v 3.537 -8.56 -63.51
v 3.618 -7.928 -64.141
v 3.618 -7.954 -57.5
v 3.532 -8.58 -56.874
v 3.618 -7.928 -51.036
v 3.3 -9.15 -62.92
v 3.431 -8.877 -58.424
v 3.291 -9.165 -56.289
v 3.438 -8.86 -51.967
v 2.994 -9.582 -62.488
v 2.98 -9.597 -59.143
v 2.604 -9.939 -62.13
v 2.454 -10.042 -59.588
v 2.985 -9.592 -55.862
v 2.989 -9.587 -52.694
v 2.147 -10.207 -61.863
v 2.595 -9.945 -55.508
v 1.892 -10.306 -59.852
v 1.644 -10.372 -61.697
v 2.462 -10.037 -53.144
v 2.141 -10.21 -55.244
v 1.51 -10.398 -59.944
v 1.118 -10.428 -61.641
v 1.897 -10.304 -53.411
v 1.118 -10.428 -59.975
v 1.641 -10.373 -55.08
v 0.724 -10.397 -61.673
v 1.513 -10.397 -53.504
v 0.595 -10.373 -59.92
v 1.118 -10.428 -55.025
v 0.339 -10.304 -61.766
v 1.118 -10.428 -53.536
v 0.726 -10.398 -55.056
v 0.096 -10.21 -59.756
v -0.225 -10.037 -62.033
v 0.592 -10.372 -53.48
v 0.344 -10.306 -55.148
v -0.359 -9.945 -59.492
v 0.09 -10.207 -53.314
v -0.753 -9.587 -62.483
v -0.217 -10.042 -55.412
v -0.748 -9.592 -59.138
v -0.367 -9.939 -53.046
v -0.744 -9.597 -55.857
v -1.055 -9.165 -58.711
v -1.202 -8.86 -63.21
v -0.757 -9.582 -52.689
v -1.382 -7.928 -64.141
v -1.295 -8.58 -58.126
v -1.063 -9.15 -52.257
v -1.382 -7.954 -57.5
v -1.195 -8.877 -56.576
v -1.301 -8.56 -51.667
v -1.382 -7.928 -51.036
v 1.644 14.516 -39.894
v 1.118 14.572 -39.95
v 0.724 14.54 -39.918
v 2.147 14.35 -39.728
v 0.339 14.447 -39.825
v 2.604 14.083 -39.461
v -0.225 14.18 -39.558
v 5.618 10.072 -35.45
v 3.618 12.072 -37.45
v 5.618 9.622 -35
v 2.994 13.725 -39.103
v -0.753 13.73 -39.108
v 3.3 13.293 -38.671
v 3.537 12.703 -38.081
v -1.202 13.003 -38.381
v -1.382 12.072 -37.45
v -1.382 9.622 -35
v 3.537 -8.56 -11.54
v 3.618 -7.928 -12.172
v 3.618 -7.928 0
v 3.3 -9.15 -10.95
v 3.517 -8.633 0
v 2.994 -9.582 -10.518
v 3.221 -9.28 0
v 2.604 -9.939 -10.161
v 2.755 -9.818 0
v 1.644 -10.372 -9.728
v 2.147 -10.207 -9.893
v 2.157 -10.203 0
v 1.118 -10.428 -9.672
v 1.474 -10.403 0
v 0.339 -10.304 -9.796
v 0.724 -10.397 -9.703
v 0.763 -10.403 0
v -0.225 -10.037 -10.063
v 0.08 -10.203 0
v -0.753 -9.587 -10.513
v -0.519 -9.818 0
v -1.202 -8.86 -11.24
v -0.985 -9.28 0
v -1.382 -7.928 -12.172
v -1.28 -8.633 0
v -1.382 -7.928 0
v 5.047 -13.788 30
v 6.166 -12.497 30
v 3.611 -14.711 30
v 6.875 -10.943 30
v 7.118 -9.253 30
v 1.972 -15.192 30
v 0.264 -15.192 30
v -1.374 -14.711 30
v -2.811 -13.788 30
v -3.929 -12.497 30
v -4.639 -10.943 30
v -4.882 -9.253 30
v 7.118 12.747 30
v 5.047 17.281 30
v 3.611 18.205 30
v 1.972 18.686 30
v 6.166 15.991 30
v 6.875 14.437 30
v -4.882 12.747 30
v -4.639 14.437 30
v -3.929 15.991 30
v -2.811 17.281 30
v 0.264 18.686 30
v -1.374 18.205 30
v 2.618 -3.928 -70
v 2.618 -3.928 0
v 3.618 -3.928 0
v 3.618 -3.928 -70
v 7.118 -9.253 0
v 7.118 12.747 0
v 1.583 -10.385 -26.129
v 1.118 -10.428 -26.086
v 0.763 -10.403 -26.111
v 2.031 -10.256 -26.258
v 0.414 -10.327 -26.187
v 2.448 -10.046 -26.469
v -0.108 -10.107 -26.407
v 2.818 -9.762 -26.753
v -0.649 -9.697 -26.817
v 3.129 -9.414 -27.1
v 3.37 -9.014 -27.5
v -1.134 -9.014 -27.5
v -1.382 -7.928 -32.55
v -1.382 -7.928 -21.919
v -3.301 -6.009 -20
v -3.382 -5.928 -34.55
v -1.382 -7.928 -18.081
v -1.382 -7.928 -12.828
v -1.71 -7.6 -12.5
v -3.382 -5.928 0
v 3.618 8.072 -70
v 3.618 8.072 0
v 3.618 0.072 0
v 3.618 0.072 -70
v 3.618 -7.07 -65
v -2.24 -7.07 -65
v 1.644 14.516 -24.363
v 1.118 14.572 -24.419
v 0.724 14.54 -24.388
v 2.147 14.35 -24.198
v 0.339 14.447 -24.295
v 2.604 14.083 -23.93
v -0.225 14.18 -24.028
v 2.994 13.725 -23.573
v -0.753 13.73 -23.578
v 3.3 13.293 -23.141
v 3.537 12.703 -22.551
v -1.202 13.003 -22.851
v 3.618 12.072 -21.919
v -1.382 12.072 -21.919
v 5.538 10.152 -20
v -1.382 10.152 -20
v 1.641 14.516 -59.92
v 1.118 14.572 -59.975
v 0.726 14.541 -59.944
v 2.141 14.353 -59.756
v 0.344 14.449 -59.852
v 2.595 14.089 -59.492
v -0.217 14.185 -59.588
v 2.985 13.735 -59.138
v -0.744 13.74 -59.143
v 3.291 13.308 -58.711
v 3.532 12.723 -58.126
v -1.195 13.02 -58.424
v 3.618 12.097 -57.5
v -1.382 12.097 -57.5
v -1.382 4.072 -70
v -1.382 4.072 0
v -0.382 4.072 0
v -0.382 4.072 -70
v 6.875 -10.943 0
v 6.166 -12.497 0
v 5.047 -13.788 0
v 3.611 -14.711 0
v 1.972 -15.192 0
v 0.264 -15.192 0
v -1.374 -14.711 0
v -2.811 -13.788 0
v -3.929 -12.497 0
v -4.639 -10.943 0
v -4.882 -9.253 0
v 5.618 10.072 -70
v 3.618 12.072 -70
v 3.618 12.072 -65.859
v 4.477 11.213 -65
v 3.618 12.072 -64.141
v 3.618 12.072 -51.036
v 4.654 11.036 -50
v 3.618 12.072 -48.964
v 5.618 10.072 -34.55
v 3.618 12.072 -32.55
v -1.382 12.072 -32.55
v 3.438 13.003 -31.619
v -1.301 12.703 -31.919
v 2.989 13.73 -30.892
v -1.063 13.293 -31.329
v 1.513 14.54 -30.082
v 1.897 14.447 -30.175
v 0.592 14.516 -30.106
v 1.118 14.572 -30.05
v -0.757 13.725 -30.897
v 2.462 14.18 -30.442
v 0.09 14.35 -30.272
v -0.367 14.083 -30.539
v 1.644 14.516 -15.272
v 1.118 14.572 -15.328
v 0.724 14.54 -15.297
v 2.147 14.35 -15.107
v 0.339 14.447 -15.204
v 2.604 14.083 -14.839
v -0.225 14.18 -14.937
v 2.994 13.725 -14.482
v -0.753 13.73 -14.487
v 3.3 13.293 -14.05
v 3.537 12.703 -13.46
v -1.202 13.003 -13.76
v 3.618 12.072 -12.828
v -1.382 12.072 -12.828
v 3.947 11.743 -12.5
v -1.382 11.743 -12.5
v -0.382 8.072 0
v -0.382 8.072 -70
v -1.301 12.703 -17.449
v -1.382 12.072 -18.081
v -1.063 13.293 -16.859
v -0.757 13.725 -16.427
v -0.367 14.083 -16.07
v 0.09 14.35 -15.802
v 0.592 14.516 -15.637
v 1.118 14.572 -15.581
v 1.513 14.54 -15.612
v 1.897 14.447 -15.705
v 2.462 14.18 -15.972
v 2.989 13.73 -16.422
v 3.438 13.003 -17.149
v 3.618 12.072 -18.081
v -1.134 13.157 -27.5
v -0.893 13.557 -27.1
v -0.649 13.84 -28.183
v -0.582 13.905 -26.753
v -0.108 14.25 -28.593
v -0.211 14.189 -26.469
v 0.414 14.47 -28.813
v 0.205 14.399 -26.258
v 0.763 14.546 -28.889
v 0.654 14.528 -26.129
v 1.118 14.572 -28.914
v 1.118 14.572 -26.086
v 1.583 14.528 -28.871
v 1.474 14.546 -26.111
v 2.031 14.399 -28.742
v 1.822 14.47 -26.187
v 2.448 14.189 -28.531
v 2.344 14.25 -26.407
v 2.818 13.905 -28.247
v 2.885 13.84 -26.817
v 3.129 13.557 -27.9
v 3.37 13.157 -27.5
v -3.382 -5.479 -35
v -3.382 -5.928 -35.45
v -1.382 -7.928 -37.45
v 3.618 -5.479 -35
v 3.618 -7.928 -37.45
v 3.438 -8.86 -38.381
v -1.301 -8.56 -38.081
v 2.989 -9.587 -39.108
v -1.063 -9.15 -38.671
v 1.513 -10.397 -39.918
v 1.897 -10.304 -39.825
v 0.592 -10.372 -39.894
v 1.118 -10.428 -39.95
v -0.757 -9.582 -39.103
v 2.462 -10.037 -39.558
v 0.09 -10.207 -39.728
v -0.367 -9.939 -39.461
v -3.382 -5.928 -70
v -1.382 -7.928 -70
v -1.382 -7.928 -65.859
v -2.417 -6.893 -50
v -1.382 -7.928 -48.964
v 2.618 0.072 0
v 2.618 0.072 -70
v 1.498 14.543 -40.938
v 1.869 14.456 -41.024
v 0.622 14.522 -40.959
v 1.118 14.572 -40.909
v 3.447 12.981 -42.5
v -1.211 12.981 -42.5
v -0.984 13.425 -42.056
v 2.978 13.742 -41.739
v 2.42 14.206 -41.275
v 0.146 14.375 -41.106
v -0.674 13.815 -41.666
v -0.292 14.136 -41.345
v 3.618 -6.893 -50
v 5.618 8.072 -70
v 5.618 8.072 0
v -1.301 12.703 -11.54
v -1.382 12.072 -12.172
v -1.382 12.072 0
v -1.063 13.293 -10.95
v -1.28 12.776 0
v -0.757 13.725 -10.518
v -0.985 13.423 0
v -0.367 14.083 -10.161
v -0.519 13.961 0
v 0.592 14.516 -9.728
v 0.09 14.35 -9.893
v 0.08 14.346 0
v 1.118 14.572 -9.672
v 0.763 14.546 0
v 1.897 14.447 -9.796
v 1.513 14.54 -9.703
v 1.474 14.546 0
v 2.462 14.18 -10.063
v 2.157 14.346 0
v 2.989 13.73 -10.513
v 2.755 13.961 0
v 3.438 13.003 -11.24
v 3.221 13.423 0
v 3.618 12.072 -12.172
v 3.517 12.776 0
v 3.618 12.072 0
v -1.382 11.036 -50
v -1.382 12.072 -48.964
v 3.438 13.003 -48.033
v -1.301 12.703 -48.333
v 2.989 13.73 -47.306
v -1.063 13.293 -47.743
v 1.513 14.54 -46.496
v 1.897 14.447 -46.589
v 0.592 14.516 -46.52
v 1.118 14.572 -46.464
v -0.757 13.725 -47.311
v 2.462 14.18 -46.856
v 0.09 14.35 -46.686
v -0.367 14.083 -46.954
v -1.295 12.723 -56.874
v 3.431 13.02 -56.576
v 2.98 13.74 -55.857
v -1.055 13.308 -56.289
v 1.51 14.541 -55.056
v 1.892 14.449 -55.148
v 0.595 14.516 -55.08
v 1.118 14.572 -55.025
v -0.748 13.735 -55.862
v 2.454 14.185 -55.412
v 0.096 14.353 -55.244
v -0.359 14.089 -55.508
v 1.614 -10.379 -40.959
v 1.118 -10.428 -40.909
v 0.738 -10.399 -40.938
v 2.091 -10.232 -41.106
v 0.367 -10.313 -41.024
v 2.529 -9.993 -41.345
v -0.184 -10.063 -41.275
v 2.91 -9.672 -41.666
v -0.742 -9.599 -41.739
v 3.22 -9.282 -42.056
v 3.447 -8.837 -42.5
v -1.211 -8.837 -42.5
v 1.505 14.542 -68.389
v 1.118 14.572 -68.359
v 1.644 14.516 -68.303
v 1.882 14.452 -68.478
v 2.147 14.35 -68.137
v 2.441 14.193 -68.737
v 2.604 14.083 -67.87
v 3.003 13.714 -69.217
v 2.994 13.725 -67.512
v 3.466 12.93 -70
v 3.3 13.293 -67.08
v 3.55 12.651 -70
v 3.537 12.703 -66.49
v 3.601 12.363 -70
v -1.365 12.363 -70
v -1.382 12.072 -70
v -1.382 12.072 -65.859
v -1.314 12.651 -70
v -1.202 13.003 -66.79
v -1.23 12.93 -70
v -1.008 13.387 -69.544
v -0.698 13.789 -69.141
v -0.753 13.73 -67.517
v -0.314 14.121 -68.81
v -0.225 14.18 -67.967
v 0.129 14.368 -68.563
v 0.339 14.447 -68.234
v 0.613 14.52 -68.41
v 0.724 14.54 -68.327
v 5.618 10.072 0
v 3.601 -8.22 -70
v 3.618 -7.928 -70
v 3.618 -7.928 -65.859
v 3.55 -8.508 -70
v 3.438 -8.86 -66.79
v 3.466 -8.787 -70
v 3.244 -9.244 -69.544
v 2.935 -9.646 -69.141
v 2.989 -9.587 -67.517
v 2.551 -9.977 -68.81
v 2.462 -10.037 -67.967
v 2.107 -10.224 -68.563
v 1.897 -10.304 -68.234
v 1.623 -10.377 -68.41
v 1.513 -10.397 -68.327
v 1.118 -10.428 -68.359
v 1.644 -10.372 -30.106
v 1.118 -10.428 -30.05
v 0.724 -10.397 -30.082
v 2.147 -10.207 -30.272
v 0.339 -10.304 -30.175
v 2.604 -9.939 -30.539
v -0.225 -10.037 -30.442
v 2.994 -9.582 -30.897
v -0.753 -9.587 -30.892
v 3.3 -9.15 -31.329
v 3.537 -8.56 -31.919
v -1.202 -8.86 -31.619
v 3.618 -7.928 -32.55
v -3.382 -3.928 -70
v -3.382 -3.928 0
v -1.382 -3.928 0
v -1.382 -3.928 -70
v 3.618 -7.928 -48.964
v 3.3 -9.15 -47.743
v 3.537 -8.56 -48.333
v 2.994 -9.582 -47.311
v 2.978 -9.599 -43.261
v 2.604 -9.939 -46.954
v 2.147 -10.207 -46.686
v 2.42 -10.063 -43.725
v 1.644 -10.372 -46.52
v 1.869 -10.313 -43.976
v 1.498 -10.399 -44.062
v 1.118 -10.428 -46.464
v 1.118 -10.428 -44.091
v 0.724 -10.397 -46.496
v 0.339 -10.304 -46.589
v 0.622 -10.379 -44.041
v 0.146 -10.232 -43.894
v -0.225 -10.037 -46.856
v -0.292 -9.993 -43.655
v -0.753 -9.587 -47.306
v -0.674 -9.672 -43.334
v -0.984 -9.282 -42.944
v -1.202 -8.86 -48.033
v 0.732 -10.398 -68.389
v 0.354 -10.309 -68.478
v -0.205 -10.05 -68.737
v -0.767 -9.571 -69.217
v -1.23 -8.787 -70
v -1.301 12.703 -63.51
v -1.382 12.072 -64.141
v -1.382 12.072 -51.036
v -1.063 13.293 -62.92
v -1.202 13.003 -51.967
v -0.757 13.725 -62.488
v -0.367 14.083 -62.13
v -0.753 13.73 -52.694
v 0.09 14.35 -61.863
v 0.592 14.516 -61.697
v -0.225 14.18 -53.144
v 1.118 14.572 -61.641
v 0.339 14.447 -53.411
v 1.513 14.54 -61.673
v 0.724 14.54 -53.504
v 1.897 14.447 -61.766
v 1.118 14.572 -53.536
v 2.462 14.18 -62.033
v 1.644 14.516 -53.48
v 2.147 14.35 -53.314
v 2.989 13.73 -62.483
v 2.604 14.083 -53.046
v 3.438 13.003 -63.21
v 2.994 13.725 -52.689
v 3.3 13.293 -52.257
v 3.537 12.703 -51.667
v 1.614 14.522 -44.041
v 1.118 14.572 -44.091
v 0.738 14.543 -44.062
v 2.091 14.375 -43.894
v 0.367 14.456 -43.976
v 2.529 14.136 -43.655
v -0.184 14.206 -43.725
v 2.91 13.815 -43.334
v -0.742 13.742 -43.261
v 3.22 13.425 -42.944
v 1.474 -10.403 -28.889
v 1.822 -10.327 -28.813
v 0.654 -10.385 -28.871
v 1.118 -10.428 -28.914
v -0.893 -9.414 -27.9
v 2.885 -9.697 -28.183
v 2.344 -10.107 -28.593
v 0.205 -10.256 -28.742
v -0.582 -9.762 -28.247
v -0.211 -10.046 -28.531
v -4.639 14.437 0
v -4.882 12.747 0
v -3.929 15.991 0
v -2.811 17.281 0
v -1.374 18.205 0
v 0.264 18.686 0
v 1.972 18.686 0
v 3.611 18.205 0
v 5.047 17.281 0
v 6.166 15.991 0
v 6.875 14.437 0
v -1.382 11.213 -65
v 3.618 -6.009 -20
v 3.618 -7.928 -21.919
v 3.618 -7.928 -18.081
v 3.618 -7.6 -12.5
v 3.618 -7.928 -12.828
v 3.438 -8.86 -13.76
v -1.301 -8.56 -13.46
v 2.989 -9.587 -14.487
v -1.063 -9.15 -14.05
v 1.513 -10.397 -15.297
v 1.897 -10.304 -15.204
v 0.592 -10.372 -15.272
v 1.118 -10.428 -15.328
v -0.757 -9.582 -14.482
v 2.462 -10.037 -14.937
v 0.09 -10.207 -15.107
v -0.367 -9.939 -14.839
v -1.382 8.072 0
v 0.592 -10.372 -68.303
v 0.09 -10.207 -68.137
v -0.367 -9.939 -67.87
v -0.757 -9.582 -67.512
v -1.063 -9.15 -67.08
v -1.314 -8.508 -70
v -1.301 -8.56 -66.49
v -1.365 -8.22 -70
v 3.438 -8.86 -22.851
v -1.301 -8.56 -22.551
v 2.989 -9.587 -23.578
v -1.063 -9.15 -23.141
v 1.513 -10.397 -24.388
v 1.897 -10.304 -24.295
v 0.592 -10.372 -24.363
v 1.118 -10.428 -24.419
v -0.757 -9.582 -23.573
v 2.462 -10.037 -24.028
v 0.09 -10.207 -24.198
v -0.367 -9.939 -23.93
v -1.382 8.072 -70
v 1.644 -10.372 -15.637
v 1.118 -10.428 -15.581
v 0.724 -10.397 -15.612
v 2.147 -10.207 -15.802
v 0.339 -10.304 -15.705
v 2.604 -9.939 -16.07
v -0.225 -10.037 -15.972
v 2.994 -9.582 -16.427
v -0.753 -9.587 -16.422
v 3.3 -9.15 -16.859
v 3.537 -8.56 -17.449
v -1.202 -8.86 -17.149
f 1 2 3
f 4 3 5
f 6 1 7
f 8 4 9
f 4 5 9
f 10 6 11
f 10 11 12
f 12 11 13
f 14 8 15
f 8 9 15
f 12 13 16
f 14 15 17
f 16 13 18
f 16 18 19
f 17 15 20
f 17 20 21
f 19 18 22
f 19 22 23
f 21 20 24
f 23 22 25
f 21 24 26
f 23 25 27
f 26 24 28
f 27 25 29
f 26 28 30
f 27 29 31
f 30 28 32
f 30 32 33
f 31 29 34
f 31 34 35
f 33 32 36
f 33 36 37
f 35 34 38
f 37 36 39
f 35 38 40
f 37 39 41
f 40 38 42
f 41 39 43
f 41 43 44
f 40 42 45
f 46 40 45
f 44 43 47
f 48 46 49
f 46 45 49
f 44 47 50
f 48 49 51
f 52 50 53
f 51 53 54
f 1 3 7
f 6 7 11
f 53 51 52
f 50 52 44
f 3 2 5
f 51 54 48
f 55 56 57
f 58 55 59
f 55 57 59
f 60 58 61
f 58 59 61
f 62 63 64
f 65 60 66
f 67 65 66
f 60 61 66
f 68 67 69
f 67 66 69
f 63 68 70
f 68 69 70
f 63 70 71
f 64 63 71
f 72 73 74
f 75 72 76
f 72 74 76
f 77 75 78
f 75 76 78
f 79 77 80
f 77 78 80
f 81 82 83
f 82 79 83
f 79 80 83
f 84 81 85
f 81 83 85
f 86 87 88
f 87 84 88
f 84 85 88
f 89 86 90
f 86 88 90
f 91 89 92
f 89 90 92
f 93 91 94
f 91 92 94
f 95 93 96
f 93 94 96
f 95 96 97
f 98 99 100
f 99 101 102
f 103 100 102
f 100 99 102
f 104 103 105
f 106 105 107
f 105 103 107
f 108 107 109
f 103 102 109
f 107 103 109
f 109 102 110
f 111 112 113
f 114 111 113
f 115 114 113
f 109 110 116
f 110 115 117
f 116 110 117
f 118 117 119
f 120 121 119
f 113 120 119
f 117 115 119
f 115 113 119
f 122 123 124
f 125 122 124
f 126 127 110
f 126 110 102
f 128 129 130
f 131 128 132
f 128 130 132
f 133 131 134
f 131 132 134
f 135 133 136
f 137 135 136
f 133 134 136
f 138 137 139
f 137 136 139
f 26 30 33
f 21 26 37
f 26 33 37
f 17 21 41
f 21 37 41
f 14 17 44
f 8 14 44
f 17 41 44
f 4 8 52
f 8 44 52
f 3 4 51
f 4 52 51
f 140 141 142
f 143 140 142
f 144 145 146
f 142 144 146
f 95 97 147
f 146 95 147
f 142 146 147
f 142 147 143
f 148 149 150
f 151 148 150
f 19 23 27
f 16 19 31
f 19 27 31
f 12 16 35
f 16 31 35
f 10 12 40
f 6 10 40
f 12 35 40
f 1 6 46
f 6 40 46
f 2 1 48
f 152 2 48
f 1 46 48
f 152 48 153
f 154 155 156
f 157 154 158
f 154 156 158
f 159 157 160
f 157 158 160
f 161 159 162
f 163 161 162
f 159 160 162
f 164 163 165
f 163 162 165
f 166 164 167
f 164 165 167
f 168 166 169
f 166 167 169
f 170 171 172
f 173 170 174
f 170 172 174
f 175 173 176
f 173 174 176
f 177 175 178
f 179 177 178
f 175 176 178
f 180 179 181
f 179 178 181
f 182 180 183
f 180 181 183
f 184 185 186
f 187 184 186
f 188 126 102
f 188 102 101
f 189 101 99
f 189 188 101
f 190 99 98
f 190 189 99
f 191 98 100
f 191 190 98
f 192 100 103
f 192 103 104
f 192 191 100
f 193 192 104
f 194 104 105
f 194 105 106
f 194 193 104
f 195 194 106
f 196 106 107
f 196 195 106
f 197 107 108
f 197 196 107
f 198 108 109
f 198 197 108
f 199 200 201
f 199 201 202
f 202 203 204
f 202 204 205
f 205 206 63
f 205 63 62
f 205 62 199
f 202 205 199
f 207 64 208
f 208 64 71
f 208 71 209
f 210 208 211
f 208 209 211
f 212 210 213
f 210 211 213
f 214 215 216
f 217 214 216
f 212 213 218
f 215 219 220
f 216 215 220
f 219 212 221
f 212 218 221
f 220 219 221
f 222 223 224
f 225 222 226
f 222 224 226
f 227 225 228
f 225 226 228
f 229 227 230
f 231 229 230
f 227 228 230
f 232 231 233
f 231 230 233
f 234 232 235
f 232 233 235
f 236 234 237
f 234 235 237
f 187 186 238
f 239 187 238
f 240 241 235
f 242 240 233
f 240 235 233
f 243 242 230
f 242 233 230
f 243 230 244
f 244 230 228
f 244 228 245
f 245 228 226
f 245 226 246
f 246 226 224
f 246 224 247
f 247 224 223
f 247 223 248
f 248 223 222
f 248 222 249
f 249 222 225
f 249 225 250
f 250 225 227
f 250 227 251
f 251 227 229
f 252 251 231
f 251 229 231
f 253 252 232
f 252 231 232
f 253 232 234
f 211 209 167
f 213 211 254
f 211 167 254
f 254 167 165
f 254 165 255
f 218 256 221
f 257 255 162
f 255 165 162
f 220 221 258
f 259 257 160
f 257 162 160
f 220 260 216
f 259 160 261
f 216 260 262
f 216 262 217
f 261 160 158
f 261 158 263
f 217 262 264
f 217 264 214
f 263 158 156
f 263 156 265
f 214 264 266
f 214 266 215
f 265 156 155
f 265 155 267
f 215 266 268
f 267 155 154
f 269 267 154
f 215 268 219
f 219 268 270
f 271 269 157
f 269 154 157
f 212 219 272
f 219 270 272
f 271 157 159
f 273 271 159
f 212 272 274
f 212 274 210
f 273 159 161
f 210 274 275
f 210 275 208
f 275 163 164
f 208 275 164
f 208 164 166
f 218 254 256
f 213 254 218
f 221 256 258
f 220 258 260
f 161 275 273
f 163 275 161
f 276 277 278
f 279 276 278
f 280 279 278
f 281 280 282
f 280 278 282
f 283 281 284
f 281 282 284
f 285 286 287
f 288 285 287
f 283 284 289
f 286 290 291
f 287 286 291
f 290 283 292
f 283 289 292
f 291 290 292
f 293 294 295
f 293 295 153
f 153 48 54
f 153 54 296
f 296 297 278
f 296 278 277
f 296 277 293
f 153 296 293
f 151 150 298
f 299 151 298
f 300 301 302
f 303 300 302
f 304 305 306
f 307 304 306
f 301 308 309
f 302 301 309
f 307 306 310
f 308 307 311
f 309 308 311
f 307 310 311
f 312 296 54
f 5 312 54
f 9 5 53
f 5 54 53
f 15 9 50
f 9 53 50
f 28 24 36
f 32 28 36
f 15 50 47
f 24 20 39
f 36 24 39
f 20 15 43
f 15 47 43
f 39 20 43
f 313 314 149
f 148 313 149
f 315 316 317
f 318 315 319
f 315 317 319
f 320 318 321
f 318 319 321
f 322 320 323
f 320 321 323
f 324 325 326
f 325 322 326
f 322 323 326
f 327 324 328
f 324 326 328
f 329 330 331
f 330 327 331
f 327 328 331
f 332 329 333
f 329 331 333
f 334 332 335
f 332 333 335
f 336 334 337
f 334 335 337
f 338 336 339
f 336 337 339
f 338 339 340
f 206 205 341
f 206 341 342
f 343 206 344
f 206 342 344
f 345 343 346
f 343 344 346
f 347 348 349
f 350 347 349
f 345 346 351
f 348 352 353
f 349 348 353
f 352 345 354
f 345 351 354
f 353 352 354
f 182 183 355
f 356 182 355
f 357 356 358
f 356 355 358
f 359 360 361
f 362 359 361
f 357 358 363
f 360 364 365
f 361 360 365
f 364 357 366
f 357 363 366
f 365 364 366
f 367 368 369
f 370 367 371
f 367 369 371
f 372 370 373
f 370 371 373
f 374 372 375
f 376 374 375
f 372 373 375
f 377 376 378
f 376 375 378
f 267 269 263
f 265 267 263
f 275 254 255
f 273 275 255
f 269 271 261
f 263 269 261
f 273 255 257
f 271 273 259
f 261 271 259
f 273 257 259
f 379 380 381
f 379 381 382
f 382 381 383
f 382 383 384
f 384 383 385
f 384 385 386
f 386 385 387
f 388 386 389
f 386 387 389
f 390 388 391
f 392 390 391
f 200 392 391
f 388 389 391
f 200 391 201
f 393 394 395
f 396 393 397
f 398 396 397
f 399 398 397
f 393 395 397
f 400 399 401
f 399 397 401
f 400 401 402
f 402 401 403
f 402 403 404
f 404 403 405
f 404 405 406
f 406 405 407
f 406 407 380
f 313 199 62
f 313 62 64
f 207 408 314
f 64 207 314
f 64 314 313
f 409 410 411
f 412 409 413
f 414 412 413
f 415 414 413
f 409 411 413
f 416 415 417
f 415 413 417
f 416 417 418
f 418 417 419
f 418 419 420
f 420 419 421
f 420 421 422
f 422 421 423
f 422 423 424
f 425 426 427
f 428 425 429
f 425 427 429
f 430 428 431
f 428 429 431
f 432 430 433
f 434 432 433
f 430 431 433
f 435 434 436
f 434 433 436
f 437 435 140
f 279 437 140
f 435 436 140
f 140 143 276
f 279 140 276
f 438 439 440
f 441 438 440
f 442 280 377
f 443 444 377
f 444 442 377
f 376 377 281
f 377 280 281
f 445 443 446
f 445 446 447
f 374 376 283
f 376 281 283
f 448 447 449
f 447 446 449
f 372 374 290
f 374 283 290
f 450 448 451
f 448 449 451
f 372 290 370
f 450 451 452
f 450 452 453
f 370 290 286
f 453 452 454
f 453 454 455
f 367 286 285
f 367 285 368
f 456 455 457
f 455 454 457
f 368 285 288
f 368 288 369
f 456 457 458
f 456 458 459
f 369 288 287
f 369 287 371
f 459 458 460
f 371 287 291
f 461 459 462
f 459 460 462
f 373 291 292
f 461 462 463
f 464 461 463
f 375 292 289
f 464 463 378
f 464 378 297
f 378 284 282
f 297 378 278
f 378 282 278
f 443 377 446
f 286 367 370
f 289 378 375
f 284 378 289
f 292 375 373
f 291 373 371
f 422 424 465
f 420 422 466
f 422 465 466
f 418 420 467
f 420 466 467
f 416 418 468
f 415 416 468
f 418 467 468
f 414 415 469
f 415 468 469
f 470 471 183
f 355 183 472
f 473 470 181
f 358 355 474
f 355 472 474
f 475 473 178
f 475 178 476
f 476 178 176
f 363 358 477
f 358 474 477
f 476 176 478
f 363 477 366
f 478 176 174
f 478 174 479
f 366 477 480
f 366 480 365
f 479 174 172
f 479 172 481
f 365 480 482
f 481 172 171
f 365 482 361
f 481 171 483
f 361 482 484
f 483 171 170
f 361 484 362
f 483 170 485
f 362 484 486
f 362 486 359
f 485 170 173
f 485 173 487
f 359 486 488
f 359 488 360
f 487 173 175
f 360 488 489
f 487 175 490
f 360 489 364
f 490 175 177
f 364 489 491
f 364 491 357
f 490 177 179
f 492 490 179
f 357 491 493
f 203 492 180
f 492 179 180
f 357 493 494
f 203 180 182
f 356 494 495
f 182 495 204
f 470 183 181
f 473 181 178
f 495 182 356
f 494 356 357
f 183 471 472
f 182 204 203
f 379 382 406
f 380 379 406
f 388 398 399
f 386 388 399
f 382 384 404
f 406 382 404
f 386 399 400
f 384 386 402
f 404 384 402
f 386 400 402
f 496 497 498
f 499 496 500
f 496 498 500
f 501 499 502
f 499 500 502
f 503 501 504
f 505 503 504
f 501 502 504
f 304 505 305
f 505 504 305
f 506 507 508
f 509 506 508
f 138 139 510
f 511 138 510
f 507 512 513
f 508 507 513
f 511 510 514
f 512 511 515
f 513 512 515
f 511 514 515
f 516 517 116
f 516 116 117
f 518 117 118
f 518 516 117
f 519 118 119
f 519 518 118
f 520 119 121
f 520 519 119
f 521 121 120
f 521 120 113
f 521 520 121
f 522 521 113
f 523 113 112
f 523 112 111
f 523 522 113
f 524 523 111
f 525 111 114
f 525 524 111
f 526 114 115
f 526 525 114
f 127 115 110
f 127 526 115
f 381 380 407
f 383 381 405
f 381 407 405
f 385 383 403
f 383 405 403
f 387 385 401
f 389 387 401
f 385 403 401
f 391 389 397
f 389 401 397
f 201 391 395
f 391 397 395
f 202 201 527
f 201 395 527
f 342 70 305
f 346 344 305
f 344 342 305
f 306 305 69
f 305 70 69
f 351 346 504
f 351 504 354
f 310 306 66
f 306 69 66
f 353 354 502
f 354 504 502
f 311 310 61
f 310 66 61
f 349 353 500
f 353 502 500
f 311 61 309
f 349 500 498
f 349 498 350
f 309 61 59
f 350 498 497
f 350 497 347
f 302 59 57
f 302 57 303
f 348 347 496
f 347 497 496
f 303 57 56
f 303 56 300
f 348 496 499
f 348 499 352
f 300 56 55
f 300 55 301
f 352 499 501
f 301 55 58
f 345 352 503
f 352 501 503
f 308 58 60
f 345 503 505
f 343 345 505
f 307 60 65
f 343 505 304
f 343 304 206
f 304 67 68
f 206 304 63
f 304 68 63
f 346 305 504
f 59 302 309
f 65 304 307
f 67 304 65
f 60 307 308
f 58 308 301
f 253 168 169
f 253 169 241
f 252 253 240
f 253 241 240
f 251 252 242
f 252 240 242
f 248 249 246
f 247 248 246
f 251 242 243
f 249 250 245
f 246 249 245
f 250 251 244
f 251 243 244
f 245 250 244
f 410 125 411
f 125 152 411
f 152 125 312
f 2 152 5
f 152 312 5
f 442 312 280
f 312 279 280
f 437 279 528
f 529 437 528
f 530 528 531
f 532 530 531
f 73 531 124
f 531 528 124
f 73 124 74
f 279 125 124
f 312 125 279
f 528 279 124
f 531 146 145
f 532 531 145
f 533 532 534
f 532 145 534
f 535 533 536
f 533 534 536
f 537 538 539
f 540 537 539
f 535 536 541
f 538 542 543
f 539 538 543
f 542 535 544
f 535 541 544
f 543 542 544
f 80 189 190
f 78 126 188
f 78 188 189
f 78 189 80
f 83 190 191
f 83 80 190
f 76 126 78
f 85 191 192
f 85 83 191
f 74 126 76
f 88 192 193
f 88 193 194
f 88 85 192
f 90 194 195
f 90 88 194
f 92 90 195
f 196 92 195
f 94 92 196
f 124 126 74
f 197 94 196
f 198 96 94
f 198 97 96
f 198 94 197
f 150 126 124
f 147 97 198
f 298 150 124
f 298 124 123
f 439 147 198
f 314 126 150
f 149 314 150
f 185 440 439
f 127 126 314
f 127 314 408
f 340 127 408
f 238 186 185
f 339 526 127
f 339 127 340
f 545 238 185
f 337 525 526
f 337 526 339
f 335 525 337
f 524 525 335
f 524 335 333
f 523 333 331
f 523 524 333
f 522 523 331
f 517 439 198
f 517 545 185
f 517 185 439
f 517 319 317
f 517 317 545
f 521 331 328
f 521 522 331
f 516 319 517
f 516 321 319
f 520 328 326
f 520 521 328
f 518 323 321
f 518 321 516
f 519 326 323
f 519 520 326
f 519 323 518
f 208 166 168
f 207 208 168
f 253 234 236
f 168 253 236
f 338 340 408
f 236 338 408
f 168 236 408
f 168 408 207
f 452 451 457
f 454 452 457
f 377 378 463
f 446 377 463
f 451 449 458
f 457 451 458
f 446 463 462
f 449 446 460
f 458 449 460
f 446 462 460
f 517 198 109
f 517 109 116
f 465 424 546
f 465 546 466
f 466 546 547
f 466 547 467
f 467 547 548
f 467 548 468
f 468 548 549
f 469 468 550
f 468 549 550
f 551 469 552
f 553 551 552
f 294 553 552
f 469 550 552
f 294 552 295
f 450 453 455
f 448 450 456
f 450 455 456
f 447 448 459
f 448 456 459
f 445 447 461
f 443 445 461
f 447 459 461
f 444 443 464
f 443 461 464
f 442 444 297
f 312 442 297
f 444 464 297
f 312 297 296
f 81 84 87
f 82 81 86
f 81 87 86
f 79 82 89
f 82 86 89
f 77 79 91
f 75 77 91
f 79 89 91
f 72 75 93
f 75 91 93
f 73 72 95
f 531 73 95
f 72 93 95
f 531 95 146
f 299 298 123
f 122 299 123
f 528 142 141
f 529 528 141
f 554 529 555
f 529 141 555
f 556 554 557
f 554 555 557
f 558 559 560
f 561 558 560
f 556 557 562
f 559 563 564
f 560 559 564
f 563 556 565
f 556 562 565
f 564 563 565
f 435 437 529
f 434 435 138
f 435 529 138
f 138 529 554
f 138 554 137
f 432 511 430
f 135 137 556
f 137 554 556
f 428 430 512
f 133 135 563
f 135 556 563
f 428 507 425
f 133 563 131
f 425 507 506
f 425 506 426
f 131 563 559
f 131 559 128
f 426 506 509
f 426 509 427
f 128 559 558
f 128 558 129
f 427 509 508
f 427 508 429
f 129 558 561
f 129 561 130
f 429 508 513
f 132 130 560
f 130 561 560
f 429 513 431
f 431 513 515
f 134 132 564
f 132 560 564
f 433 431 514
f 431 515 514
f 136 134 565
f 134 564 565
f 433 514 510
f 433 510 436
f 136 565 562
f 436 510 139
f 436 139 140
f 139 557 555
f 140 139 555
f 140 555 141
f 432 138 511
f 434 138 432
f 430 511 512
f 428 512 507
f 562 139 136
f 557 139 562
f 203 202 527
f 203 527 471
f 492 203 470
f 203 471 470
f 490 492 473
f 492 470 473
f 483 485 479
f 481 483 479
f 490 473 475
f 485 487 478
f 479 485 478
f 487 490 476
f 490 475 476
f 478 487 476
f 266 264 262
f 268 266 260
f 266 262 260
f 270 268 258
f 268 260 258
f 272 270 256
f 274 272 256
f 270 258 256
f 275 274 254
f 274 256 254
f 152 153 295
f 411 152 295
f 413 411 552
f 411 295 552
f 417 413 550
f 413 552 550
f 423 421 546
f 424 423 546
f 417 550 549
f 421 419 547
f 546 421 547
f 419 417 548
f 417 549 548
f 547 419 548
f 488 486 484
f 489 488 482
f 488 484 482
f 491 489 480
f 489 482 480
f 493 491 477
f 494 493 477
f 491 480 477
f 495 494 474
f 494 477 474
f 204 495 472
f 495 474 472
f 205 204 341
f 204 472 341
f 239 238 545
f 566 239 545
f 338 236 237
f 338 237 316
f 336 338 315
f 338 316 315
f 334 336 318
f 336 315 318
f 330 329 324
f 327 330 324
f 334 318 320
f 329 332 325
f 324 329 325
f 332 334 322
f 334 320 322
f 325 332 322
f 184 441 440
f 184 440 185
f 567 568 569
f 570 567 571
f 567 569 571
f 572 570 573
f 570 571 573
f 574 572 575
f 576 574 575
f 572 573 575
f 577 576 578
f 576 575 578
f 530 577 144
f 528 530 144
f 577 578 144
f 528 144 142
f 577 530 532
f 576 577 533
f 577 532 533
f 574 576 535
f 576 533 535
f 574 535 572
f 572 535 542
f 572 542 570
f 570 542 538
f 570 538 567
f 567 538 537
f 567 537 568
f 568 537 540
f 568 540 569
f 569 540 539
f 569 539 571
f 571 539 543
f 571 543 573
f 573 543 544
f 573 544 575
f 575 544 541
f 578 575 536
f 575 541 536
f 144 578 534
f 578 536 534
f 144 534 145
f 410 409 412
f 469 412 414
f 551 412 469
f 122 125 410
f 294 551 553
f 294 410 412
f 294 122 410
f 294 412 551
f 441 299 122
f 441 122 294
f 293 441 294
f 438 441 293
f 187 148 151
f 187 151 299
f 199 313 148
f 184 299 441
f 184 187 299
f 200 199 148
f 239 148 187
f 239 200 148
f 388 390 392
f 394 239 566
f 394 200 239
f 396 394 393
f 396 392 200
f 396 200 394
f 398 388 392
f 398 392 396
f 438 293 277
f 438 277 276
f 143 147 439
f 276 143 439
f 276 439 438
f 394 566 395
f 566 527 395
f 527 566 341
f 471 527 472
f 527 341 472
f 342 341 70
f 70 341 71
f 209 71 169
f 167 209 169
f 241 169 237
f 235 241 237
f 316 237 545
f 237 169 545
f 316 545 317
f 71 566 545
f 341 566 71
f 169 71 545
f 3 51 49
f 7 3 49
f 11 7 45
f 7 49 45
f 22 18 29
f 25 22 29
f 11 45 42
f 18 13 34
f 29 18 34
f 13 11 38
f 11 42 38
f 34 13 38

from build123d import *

# Parameters (mm, degrees)
KEY_MAIN_EXTURSION_DEPTH = 70
KEY_HANDLE_DEPTH         = 30
KEY_CUT_DEPTH            = 74.277343039


with BuildPart() as part:
    # Szkic1 → key-main-extursion (new body)
    with BuildSketch(Plane.XY):
        with BuildLine():
            Line((-1.381684649, -3.928424018), (-1.381684649, 4.071575982))
            Line((-1.381684649, 4.071575982), (-0.381684649, 4.071575982))
            Line((-0.381684649, 4.071575982), (-0.381684649, 8.071575982))
            Line((-0.381684649, 8.071575982), (-1.381684649, 8.071575982))
            Line((-1.381684649, 8.071575982), (-1.381684649, 12.071575982))
            ThreePointArc((-1.381684649, 12.071575982), (1.118315351, 14.571575982), (3.618315351, 12.071575982))
            Line((3.618315351, 12.071575982), (5.618315351, 10.071575982))
            Line((5.618315351, 10.071575982), (5.618315351, 8.071575982))
            Line((5.618315351, 8.071575982), (3.618315351, 8.071575982))
            Line((3.618315351, 8.071575982), (3.618315351, 0.071575982))
            Line((3.618315351, 0.071575982), (2.618315351, 0.071575982))
            Line((2.618315351, 0.071575982), (2.618315351, -3.928424018))
            Line((2.618315351, -3.928424018), (3.618315351, -3.928424018))
            Line((3.618315351, -3.928424018), (3.618315351, -7.928424018))
            ThreePointArc((3.618315351, -7.928424018), (1.118315351, -10.428424018), (-1.381684649, -7.928424018))
            Line((-1.381684649, -7.928424018), (-3.381684649, -5.928424018))
            Line((-3.381684649, -5.928424018), (-3.381684649, -3.928424018))
            Line((-3.381684649, -3.928424018), (-1.381684649, -3.928424018))
        make_face()
    extrude(amount=-KEY_MAIN_EXTURSION_DEPTH)

    # key-handle-sketch → key-handle (add)
    with BuildSketch(Plane.XY):
        with BuildLine():
            Line((-4.881684649, -9.253034266), (-4.881684649, 12.746965734))
            ThreePointArc((-4.881684649, 12.746965734), (1.118315351, 18.746965734), (7.118315351, 12.746965734))
            Line((7.118315351, 12.746965734), (7.118315351, -9.253034266))
            ThreePointArc((7.118315351, -9.253034266), (1.118315351, -15.253034266), (-4.881684649, -9.253034266))
        make_face()
    extrude(amount=KEY_HANDLE_DEPTH)

    # Szkic5 → key-cut (cut, through all)
    with BuildSketch(Plane.ZY.offset(3.75)):
        Polygon((-9.671572875, 14.571575982), (-15.328427125, 14.571575982), (-12.5, 11.743148857), align=None)
        Polygon((-15.580582618, 14.571575982), (-24.419417382, 14.571575982), (-20, 10.1521586), align=None)
        Polygon((-26.085786438, 14.571575982), (-28.914213562, 14.571575982), (-27.5, 13.15736242), align=None)
        Polygon((-30.050252532, 14.571575982), (-39.949747468, 14.571575982), (-35, 9.621828514), align=None)
        Polygon((-40.909009742, 14.571575982), (-44.090990258, 14.571575982), (-42.5, 12.980585724), align=None)
        Polygon((-46.464466094, 14.571575982), (-53.535533906, 14.571575982), (-50, 11.036042076), align=None)
        Polygon((-55.025126266, 14.571575982), (-59.974873734, 14.571575982), (-57.5, 12.096702248), align=None)
        Polygon((-61.641242789, 14.571575982), (-68.358757211, 14.571575982), (-65, 11.212818771), align=None)
        Polygon((-68.358757211, 14.571575982), (-70, 14.571575982), (-70, 12.930333193), align=None)
        Polygon((-70, -8.787181229), (-70, -10.428424018), (-68.358757211, -10.428424018), align=None)
        Polygon((-12.5, -7.599996893), (-15.328427125, -10.428424018), (-9.671572875, -10.428424018), align=None)
        Polygon((-20, -6.009006636), (-24.419417382, -10.428424018), (-15.580582618, -10.428424018), align=None)
        Polygon((-27.5, -9.014210456), (-28.914213562, -10.428424018), (-26.085786438, -10.428424018), align=None)
        Polygon((-35, -5.47867655), (-39.949747468, -10.428424018), (-30.050252532, -10.428424018), align=None)
        Polygon((-42.5, -8.83743376), (-44.090990258, -10.428424018), (-40.909009742, -10.428424018), align=None)
        Polygon((-50, -6.892890112), (-53.535533906, -10.428424018), (-46.464466094, -10.428424018), align=None)
        Polygon((-57.5, -7.953550284), (-59.974873734, -10.428424018), (-55.025126266, -10.428424018), align=None)
        Polygon((-65, -7.069666807), (-68.358757211, -10.428424018), (-61.641242789, -10.428424018), align=None)
    extrude(amount=-KEY_CUT_DEPTH, mode=Mode.SUBTRACT)


solid = part.part
